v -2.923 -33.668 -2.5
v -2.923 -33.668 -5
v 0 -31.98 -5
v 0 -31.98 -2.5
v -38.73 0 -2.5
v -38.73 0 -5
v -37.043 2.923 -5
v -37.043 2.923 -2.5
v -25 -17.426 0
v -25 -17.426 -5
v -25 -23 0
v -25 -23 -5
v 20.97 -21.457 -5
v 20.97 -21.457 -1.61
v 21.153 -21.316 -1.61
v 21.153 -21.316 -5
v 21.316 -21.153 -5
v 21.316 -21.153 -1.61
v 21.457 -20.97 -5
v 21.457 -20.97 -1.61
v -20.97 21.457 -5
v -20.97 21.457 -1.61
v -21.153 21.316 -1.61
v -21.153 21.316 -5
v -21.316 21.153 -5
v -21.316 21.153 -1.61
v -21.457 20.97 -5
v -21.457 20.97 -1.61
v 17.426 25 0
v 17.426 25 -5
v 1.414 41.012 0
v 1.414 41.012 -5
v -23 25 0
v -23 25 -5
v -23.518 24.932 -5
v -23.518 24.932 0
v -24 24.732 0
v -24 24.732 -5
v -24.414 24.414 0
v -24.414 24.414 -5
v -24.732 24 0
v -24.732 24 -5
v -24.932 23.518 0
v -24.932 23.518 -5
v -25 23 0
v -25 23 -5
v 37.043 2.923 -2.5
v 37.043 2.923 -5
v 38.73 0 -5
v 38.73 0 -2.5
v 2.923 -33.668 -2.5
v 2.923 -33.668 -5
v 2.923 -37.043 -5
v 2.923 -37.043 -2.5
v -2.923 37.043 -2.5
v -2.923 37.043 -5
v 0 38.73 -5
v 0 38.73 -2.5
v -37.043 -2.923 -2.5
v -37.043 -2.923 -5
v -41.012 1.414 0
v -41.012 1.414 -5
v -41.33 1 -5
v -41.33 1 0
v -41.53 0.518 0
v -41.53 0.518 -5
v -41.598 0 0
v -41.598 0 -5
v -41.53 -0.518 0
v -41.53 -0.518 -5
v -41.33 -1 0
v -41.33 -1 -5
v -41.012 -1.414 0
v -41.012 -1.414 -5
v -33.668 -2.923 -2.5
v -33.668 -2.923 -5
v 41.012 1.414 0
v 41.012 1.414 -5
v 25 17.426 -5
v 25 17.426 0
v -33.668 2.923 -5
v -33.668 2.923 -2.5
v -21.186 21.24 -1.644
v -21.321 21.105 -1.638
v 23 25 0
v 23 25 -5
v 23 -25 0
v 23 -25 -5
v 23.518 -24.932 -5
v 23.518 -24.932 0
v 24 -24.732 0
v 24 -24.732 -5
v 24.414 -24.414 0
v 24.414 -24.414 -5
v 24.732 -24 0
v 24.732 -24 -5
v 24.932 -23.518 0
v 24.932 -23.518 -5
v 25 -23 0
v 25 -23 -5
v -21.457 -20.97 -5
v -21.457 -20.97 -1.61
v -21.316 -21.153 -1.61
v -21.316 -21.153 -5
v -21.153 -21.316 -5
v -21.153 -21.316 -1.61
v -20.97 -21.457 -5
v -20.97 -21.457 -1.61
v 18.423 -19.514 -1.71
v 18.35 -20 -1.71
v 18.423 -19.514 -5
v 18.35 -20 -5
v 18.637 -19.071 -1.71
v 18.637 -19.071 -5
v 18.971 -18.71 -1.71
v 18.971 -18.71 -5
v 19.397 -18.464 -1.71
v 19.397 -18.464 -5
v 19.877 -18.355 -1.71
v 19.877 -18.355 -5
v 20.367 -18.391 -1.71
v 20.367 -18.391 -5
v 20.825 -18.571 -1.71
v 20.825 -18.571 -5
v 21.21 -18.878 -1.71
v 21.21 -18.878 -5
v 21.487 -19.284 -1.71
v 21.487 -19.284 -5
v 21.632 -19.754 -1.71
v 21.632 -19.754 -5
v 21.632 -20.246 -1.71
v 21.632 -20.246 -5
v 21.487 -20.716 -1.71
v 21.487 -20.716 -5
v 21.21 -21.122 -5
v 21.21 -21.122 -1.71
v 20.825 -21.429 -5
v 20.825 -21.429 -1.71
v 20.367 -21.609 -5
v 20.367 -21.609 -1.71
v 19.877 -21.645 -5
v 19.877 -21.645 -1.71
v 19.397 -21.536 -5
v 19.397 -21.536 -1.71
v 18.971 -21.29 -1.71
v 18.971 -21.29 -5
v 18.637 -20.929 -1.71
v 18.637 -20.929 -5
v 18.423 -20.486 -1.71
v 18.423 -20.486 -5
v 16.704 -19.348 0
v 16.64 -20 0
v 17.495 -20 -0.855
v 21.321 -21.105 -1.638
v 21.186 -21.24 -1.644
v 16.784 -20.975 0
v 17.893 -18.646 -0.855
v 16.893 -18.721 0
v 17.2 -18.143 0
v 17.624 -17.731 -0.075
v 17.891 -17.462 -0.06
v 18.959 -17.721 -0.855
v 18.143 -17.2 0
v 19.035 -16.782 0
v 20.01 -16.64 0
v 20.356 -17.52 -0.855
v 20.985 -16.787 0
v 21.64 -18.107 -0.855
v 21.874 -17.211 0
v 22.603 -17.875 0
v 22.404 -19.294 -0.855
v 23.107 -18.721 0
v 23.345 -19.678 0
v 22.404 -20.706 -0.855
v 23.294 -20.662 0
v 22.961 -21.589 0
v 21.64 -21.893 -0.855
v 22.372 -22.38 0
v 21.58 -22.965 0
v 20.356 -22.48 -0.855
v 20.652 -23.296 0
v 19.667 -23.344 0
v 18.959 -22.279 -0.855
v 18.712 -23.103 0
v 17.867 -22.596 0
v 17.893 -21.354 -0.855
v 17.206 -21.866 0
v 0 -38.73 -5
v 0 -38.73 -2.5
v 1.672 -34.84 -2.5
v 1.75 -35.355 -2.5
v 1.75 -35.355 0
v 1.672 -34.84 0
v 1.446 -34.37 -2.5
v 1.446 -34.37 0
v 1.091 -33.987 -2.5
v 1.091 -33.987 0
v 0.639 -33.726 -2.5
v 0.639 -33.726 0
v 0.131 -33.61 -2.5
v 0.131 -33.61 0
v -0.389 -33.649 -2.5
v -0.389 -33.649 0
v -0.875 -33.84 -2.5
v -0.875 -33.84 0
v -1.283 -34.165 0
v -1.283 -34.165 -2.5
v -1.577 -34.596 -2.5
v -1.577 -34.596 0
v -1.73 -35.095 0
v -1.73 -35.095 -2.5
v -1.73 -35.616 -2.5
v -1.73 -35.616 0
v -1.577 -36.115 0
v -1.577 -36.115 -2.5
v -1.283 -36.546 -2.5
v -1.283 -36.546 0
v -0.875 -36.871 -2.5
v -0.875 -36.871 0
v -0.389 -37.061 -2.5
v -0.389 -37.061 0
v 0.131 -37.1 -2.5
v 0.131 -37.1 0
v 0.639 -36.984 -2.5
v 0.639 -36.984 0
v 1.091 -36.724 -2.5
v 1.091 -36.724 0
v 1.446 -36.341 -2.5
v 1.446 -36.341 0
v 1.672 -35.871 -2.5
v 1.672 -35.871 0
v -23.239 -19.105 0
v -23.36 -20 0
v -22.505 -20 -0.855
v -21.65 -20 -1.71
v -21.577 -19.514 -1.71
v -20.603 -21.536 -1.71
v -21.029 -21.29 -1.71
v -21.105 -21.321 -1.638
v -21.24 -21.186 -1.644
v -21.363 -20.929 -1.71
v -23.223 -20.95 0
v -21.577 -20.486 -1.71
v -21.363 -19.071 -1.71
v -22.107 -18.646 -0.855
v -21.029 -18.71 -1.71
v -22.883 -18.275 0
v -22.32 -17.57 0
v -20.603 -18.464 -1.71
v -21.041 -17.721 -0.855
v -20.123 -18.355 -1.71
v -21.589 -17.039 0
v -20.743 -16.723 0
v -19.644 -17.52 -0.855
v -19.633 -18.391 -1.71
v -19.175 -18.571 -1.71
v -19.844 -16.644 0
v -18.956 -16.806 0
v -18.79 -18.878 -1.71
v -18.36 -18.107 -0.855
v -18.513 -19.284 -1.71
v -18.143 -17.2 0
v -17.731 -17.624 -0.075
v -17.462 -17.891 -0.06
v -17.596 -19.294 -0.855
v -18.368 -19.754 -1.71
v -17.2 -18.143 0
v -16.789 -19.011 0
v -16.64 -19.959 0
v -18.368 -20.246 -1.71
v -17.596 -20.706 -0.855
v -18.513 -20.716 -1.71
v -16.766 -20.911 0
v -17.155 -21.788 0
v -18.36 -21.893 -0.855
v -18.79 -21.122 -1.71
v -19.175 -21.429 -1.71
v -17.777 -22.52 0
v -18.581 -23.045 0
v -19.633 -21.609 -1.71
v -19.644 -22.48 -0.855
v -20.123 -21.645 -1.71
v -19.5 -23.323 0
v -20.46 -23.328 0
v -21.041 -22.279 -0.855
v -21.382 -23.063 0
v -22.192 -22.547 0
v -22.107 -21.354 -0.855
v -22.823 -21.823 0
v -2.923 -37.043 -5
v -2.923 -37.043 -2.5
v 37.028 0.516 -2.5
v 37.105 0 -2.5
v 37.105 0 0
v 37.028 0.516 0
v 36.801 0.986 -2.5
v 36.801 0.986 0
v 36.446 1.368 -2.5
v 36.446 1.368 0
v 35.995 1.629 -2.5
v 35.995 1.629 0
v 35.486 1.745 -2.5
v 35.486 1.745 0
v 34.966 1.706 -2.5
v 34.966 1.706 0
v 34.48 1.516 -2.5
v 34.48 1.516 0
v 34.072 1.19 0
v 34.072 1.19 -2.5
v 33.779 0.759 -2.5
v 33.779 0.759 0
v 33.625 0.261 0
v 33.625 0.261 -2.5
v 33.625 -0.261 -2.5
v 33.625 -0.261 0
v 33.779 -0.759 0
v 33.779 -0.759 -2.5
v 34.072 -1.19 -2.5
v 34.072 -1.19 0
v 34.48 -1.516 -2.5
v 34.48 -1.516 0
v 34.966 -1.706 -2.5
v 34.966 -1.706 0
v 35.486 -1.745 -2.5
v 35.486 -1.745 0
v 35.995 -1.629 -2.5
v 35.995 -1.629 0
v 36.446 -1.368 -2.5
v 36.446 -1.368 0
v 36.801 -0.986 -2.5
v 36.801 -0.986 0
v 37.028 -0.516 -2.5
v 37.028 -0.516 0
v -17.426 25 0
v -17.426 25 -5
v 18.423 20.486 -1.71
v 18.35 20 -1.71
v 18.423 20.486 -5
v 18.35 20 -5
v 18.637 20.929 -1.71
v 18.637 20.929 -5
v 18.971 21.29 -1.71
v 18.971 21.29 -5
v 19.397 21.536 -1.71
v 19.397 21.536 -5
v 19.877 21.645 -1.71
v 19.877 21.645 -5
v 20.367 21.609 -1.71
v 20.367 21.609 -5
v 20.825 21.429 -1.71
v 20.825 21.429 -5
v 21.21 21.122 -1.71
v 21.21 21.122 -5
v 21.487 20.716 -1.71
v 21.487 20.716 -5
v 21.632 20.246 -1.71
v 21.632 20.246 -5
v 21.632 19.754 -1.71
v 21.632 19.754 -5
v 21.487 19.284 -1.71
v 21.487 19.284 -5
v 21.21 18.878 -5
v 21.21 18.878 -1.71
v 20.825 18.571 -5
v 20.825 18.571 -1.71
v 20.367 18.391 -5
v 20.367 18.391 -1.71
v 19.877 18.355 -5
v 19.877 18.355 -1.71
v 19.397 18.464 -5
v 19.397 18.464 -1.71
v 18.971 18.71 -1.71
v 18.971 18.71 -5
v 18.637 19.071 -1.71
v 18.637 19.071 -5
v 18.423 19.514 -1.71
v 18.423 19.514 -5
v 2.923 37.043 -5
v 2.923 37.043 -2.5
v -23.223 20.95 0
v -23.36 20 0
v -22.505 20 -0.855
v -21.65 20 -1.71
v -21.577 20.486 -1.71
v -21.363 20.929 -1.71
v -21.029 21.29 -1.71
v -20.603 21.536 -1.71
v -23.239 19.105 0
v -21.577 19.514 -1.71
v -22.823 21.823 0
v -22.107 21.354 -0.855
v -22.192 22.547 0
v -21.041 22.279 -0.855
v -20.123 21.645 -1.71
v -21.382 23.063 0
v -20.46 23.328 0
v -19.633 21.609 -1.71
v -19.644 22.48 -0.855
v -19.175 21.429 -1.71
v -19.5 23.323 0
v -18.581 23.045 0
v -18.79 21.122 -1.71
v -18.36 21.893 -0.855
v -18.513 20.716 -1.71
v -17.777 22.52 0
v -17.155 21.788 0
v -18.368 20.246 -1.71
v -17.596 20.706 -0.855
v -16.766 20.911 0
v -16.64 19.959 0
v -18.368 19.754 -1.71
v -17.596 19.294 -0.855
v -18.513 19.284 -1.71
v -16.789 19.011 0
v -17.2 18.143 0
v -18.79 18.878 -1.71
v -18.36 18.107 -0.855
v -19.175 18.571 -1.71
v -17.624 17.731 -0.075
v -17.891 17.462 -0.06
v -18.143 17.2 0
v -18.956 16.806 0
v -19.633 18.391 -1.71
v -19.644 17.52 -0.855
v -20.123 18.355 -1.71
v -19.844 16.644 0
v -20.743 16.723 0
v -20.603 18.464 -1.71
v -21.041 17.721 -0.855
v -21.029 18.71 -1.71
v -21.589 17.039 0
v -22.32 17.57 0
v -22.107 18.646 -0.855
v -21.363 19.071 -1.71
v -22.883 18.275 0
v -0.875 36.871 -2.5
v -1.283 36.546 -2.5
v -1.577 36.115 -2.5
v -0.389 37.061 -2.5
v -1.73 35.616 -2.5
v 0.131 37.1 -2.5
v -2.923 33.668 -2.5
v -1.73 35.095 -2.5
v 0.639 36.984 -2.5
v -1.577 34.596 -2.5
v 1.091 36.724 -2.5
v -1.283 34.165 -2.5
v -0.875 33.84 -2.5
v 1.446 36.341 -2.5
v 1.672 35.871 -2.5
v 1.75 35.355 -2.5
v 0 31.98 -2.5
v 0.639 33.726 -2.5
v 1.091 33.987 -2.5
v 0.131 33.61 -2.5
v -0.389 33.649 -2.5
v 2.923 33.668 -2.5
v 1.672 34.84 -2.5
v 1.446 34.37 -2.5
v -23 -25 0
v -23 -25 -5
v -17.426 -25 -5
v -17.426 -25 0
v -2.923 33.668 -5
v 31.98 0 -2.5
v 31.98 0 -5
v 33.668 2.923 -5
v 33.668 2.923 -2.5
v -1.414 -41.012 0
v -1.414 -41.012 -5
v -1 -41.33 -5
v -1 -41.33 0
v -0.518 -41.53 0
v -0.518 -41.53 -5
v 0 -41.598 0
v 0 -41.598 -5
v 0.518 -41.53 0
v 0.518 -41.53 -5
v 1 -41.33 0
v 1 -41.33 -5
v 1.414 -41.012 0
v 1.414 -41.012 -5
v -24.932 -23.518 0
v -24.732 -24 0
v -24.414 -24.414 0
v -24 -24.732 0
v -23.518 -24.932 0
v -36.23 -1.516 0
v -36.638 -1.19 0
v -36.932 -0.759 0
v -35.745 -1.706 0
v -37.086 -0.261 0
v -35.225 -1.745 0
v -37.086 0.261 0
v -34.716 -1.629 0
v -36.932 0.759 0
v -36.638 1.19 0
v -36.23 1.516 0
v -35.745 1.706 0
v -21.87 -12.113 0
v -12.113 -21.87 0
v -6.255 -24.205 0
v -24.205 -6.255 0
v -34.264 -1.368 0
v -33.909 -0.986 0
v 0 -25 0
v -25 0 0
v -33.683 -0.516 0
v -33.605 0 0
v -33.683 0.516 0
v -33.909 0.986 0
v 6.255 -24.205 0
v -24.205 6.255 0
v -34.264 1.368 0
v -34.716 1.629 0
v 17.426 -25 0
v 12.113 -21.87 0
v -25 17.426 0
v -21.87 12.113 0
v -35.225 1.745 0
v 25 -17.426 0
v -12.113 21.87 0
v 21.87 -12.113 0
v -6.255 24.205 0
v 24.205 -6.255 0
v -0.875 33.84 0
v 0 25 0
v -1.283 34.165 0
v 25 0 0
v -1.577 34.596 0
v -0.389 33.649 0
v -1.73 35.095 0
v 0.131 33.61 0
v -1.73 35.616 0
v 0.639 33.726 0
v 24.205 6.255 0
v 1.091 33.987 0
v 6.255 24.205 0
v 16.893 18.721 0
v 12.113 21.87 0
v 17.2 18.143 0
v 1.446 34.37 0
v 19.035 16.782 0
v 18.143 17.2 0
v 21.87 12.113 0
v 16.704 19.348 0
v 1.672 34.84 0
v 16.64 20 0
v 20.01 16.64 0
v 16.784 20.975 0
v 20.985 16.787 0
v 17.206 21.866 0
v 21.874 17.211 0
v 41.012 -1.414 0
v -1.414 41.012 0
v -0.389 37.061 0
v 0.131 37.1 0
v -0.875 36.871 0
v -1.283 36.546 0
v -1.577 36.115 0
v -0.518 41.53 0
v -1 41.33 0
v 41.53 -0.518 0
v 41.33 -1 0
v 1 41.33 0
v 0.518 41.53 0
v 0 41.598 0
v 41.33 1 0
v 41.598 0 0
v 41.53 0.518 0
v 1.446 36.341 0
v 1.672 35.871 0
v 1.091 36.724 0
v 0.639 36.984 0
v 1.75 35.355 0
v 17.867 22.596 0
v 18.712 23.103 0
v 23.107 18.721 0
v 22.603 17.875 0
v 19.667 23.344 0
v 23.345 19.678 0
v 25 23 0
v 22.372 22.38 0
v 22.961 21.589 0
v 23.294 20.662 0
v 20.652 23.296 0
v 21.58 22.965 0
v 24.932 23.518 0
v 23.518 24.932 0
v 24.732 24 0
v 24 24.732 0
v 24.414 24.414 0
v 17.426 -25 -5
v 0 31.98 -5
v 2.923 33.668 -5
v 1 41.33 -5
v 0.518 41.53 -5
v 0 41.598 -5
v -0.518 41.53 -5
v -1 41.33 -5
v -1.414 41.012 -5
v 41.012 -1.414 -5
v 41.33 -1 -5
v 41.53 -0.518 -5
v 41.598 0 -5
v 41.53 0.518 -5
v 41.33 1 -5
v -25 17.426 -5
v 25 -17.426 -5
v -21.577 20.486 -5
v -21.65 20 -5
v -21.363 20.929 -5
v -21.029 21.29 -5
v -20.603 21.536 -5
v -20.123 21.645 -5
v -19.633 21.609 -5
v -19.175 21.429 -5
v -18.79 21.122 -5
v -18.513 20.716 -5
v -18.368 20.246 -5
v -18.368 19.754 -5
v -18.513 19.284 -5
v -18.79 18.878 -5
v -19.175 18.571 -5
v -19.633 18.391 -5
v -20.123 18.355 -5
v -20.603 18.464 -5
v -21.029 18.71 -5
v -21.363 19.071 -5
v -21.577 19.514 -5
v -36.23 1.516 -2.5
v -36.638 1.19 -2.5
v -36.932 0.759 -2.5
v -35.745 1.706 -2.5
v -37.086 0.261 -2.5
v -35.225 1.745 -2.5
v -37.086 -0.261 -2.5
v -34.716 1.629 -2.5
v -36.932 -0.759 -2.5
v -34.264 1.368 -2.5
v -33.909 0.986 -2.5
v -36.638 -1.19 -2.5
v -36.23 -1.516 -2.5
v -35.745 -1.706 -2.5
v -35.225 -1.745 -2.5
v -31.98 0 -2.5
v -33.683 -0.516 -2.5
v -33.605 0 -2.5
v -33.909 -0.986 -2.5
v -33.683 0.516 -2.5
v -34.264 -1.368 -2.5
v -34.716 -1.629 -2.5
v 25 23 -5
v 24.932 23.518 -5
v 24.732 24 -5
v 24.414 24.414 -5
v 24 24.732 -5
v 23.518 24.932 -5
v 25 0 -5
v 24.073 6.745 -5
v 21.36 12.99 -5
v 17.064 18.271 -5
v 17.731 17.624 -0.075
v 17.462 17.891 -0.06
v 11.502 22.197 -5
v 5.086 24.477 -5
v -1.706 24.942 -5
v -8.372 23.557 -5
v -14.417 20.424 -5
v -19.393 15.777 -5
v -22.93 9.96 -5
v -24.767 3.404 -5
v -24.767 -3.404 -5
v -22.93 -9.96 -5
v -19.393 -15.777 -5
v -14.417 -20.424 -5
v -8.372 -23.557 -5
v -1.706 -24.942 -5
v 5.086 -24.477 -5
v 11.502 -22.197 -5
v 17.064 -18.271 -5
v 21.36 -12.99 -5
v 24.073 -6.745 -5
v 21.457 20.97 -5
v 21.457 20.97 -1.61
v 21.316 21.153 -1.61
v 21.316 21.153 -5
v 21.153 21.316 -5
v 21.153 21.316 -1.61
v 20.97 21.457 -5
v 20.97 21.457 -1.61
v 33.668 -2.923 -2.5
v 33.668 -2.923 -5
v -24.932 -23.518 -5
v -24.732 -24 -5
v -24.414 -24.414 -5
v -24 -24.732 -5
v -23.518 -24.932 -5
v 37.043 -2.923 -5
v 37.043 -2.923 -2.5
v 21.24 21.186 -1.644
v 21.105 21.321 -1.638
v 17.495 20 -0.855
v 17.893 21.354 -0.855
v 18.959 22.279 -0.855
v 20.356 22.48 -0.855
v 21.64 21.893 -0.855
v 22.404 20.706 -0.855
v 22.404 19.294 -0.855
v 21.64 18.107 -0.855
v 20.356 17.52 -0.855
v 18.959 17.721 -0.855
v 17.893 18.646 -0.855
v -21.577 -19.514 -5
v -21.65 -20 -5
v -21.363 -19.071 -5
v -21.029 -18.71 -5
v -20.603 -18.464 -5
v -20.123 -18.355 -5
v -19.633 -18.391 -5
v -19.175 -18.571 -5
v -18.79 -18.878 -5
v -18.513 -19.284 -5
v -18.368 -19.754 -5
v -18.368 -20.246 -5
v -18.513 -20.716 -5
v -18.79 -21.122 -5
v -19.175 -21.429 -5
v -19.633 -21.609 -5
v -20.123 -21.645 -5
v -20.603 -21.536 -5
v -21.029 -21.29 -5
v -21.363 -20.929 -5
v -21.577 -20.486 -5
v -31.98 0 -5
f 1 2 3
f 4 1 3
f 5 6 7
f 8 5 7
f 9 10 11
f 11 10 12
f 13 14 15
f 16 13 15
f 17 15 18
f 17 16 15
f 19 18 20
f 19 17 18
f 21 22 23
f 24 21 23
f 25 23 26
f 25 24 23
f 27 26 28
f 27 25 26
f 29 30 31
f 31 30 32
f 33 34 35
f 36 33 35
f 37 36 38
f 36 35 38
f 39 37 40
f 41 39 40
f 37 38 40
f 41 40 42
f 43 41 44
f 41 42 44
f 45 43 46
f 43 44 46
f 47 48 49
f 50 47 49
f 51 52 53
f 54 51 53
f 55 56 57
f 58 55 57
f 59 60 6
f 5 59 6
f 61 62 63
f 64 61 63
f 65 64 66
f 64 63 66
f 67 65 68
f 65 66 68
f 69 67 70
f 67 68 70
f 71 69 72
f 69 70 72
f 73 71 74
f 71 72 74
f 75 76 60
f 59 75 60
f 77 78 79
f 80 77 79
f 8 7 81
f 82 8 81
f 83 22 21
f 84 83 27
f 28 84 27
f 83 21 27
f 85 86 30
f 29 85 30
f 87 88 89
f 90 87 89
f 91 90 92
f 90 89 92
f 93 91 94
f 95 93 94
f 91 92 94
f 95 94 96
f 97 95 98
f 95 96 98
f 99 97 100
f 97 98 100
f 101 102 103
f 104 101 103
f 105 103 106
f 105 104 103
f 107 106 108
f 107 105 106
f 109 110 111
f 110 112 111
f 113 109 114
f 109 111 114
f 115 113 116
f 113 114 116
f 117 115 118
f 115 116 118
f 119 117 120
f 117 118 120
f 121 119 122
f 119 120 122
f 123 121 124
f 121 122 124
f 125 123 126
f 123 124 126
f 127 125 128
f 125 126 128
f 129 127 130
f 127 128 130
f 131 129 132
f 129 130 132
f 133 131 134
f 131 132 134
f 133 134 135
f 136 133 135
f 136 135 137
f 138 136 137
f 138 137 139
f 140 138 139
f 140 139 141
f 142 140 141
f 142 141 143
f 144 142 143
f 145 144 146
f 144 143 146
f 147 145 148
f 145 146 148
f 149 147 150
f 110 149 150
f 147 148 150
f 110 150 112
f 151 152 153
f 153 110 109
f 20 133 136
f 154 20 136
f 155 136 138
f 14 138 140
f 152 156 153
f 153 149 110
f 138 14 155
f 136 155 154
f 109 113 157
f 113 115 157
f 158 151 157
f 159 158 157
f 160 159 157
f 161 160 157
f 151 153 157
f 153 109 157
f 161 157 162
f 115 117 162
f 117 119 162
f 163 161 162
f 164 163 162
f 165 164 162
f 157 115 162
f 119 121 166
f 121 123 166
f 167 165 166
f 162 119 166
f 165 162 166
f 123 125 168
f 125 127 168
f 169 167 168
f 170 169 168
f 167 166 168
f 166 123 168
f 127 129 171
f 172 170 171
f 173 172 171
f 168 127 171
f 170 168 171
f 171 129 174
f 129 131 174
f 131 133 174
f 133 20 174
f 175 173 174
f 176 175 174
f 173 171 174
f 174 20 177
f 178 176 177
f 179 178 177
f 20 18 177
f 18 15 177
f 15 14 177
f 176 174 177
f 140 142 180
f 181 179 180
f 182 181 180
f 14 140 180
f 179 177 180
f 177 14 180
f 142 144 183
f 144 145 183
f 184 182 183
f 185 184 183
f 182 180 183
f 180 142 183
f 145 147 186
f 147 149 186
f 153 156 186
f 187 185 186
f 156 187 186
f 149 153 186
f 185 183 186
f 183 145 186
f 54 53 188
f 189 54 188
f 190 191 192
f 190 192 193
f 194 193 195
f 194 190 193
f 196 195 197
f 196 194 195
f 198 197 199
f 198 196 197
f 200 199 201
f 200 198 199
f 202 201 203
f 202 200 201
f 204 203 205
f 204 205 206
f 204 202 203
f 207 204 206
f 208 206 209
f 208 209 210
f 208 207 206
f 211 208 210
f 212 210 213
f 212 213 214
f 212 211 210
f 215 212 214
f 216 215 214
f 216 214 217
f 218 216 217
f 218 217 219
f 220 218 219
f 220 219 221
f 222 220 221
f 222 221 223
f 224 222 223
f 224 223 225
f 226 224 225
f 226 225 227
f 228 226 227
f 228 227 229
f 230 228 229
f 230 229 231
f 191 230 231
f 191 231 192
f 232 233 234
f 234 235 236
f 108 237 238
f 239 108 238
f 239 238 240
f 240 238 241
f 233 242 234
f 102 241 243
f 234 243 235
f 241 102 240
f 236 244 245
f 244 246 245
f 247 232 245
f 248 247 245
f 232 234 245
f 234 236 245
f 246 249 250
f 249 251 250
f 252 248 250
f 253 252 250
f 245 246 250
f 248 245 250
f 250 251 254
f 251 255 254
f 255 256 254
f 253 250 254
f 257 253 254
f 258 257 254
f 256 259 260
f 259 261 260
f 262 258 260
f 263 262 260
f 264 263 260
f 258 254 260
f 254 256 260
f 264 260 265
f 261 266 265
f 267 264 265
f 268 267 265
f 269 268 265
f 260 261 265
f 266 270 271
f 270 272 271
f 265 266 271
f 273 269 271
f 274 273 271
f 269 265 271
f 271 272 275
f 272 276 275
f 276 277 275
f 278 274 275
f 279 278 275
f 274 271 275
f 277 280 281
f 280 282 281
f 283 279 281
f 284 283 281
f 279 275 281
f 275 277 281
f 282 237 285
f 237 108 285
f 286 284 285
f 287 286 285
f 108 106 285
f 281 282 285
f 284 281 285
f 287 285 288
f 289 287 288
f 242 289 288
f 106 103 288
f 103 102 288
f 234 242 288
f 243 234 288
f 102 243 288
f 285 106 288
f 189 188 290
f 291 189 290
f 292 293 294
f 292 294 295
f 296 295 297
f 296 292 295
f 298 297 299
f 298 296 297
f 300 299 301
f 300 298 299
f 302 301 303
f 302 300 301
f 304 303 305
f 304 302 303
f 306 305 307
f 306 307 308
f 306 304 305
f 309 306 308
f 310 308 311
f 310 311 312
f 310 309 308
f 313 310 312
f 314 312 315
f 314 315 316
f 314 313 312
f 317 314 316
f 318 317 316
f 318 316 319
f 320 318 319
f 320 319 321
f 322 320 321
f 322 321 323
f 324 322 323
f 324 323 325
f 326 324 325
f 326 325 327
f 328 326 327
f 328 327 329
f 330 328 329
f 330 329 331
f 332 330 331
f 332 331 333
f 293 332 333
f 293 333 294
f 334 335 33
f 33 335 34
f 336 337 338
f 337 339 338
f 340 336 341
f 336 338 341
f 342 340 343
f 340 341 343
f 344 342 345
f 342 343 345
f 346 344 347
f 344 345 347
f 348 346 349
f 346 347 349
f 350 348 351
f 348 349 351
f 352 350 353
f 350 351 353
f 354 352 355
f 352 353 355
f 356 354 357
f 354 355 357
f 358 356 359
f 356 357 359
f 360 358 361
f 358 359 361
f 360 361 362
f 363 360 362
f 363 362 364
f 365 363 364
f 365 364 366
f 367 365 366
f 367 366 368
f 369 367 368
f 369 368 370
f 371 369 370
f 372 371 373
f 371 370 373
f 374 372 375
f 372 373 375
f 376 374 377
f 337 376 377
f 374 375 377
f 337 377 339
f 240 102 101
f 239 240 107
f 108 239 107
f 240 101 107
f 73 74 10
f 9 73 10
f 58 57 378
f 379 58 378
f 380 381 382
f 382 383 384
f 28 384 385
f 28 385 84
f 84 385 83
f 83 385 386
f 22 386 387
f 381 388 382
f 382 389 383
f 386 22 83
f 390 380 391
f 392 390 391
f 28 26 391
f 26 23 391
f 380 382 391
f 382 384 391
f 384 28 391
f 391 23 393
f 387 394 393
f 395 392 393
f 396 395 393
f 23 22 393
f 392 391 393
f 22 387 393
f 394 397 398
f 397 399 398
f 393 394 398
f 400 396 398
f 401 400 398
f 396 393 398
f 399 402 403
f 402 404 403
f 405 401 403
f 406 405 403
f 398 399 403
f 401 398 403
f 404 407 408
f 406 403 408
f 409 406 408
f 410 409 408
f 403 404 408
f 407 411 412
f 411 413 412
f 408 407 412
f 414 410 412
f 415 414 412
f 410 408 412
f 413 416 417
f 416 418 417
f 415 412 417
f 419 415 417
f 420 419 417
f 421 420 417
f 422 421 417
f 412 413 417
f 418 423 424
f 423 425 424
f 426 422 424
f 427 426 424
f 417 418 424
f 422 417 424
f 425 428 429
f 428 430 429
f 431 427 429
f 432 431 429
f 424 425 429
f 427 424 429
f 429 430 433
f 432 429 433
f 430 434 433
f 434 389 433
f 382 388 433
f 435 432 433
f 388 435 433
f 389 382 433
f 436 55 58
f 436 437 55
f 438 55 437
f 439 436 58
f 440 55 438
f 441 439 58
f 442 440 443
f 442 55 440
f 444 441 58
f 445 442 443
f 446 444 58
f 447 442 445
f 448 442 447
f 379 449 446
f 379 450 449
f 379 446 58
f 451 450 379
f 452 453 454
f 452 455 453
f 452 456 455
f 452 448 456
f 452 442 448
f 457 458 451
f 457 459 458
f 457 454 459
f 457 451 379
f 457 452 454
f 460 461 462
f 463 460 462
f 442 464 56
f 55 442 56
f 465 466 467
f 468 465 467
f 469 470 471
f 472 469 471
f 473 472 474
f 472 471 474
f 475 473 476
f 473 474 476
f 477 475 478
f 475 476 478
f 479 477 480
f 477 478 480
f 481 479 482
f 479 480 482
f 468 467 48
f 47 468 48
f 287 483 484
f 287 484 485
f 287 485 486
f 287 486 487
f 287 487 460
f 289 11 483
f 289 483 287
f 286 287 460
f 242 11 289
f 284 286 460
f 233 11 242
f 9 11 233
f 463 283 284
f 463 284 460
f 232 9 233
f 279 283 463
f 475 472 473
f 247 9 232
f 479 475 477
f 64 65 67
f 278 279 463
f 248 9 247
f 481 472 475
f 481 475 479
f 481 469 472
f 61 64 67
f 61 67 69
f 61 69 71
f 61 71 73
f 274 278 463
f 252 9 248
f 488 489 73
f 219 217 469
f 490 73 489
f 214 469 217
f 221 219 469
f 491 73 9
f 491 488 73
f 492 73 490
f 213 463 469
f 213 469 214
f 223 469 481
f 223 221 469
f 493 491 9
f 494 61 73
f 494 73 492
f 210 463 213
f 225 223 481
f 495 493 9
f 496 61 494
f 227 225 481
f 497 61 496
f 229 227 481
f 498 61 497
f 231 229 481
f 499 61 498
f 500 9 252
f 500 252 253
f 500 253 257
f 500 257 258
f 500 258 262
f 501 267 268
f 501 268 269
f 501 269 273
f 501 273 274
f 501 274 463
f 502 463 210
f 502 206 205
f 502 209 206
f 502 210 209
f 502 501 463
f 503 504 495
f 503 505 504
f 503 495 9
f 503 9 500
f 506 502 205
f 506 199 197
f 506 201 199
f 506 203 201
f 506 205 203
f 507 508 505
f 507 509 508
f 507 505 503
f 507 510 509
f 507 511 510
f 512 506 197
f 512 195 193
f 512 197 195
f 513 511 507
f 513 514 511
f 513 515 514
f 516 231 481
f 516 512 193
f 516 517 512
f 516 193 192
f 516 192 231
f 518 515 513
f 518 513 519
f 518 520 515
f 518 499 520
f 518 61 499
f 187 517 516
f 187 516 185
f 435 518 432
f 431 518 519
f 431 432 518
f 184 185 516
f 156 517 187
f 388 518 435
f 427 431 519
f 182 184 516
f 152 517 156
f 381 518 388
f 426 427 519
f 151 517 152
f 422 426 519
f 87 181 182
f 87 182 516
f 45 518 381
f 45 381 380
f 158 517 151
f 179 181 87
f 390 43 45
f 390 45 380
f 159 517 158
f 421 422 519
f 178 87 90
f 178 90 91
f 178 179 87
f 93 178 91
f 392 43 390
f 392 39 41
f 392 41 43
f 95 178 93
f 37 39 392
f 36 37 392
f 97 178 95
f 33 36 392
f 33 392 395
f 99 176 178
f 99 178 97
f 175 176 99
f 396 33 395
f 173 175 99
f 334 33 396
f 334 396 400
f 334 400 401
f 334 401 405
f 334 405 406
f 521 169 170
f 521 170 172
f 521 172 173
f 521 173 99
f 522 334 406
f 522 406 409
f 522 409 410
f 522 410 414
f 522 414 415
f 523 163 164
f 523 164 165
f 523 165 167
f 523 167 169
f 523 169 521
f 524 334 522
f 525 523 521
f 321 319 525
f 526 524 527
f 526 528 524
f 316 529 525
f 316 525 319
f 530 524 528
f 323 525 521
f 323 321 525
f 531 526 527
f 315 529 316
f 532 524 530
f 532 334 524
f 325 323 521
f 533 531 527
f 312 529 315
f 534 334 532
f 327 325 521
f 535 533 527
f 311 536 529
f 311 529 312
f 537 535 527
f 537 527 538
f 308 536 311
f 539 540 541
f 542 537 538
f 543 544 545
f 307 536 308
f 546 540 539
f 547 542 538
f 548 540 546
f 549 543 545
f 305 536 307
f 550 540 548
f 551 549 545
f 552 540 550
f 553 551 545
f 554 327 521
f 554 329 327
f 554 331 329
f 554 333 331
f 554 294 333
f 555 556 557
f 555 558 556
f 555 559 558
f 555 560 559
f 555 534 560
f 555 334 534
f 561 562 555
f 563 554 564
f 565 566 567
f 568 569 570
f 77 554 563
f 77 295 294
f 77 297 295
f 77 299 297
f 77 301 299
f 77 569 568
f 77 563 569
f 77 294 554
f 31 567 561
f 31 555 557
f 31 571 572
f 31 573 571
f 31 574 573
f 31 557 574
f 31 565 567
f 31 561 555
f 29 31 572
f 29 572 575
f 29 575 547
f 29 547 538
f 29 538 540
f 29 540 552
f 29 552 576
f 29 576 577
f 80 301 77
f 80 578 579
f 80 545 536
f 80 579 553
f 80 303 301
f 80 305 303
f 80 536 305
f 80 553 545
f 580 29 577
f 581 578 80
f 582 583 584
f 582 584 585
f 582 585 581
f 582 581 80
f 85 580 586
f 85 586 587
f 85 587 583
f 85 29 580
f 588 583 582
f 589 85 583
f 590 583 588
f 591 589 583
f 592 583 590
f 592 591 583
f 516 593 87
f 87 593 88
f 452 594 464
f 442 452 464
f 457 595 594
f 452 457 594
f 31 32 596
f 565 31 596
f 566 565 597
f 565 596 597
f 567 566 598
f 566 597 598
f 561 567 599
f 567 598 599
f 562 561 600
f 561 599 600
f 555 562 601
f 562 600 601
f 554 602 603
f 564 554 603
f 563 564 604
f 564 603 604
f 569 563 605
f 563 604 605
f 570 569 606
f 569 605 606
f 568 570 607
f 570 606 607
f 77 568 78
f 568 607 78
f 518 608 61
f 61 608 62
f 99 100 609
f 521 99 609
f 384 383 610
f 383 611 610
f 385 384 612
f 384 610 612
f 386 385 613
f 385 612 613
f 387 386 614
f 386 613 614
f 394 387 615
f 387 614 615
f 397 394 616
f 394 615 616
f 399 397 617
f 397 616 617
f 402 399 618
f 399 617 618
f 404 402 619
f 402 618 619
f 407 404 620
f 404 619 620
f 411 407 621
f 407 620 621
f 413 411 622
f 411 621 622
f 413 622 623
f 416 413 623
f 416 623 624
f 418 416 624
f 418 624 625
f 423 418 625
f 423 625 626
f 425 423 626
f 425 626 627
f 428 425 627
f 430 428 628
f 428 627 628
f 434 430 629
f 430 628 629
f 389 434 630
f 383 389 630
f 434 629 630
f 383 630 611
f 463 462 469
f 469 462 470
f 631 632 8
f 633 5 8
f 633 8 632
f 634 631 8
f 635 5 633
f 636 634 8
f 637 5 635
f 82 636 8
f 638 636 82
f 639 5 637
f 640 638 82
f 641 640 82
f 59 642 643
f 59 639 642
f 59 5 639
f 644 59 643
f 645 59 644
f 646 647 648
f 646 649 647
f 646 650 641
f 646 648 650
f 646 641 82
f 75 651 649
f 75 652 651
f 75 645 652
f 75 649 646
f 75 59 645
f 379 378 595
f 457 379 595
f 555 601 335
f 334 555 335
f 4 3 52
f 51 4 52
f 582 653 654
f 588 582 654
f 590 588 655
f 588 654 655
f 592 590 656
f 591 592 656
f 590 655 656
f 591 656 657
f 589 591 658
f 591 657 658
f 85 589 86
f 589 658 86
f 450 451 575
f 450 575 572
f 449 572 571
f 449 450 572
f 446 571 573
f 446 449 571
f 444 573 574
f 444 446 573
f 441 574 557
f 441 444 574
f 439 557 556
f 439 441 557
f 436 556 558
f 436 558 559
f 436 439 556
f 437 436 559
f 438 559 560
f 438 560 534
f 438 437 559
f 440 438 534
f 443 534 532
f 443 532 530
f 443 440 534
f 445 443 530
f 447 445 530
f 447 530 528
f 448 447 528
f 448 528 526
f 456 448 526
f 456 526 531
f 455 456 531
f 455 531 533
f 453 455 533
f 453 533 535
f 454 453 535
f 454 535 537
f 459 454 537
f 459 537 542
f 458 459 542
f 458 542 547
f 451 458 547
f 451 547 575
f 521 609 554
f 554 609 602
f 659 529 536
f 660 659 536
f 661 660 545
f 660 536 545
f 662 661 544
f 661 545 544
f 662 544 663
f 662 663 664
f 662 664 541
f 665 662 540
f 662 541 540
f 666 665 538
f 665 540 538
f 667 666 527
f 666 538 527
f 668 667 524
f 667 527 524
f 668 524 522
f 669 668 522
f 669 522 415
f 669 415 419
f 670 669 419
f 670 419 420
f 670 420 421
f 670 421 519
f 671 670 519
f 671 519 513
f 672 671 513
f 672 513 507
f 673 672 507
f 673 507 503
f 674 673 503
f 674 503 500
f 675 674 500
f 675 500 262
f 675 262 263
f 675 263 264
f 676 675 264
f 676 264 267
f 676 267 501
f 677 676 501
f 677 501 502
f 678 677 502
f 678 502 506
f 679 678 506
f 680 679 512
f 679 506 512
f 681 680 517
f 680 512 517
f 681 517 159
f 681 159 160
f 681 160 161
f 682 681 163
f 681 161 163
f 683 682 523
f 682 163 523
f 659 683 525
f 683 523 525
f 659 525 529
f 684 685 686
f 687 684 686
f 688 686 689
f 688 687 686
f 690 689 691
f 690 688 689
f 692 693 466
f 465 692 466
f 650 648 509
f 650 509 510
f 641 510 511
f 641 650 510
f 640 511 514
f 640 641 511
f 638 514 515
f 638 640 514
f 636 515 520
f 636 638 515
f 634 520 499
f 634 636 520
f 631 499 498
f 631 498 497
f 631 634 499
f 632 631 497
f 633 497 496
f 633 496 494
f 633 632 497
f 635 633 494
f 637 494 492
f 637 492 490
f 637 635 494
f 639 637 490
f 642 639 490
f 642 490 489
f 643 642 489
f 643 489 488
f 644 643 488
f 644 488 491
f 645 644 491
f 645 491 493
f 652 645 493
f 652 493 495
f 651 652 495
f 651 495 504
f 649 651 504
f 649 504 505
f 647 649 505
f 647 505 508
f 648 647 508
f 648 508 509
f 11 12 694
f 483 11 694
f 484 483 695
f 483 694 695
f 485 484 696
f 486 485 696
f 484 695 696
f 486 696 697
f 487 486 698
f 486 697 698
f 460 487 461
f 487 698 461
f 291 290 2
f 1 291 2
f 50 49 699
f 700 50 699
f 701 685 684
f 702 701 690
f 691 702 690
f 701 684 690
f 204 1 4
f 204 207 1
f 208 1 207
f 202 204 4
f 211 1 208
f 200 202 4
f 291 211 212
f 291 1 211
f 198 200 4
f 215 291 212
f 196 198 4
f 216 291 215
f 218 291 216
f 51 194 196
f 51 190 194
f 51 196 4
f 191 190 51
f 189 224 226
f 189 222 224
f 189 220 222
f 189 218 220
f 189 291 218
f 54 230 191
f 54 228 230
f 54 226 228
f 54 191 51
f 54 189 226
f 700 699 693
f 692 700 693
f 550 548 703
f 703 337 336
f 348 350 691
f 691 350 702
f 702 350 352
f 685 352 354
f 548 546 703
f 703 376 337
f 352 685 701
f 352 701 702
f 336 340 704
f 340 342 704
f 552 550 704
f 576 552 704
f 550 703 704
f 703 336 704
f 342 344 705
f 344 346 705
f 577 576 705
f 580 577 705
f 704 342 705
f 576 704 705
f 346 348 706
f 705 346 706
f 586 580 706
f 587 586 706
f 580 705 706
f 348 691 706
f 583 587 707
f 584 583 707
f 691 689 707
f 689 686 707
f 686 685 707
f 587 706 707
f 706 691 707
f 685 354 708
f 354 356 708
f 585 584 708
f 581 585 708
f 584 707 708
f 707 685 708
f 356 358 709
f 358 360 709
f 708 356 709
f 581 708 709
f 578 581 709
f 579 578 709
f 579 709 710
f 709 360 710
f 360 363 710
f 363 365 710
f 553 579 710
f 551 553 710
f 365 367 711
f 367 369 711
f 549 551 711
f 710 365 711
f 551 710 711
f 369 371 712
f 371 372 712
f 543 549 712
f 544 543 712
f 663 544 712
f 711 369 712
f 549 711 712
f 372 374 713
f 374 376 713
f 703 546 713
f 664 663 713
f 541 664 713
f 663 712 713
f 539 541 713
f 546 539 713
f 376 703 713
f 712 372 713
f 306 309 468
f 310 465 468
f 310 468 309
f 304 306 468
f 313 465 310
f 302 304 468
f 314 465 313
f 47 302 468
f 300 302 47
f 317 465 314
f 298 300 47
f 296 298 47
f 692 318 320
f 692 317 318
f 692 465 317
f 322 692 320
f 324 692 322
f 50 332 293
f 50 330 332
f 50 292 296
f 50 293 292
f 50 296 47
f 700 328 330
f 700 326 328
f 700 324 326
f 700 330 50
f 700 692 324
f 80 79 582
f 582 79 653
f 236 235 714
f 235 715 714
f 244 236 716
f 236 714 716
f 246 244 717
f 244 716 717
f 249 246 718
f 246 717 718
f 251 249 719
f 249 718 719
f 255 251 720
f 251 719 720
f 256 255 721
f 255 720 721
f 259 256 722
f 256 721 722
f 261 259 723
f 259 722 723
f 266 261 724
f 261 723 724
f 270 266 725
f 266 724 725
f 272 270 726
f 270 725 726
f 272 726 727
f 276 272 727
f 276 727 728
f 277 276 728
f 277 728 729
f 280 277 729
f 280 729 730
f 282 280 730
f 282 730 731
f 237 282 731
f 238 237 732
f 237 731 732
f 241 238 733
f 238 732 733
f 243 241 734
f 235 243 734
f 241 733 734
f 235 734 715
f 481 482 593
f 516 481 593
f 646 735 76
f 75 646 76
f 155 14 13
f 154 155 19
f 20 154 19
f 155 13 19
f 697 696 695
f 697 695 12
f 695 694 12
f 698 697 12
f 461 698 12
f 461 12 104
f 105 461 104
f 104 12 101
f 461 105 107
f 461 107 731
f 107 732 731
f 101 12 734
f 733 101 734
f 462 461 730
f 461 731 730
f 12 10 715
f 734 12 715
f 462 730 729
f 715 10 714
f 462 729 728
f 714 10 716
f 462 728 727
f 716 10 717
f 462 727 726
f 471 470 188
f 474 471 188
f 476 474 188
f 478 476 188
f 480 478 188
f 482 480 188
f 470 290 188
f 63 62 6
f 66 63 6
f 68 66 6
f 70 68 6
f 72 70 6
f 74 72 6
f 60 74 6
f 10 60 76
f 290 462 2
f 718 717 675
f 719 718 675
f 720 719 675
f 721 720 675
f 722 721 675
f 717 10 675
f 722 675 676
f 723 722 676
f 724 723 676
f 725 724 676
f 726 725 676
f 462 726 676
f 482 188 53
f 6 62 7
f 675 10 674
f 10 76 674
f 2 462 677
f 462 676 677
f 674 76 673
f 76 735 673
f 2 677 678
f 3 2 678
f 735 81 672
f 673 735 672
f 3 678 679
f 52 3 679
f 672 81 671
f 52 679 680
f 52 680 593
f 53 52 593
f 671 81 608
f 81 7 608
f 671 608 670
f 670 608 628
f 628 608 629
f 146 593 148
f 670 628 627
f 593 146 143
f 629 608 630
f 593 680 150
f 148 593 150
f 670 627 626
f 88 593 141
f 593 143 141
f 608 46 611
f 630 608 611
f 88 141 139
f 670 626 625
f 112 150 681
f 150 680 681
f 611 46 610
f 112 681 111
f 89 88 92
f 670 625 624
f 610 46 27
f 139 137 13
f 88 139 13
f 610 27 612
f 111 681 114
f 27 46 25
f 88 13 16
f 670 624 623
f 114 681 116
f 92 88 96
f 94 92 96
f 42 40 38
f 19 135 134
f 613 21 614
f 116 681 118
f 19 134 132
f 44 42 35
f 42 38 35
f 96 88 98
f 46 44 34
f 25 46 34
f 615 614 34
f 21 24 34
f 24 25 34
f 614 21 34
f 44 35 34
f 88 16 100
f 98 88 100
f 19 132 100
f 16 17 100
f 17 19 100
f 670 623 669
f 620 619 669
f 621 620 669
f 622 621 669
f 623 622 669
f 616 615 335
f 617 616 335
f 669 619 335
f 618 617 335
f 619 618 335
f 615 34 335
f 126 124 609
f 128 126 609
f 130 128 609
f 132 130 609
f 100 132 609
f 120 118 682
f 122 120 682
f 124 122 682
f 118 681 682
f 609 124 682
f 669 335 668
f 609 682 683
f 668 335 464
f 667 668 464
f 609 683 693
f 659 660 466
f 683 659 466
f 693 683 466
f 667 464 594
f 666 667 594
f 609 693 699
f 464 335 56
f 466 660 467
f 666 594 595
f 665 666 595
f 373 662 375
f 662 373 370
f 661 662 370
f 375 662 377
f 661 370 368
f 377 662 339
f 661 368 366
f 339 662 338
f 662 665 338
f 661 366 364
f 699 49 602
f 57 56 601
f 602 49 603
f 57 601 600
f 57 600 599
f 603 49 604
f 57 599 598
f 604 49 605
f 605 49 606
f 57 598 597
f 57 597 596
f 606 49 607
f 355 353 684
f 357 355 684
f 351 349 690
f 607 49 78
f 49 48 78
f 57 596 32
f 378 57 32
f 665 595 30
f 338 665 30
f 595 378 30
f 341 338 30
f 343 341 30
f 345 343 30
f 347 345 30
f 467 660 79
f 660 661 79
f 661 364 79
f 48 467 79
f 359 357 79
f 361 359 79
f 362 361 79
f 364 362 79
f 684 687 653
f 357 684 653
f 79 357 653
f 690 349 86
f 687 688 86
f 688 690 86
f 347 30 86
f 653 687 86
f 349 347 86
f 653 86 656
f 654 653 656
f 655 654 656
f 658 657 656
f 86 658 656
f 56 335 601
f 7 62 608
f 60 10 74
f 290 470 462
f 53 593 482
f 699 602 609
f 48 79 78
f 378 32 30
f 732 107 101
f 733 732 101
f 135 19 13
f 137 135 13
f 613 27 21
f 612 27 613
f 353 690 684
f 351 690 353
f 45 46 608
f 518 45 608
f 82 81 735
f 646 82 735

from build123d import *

# Parameters (mm, degrees)
F1_R           = 1.75
F2_DEPTH       = 5
F3_R           = 1.75
F4_DEPTH       = 5
F6_R           = 25
F7_DEPTH       = 5.001
F9_D           = 3.3
F9_CSINK_D     = 6.72
F9_CSINK_ANGLE = 90
F10_R          = 1.75
F11_DEPTH      = 2.5


with BuildPart() as f2:
    # F1 (on Top) → F2 (new body)
    with BuildSketch(Plane.XY):
        with BuildLine():
            Line((-1.4142135624, 41.0121933088), (-41.0121933088, 1.4142135624))
            ThreePointArc((-41.0121933088, 1.4142135624), (-41.5979797464, 0), (-41.0121933088, -1.4142135624))
            Line((-41.0121933088, -1.4142135624), (-1.4142135624, -41.0121933088))
            ThreePointArc((-1.4142135624, -41.0121933088), (0, -41.5979797464), (1.4142135624, -41.0121933088))
            Line((1.4142135624, -41.0121933088), (41.0121933088, -1.4142135624))
            ThreePointArc((41.0121933088, -1.4142135624), (41.5979797464, 0), (41.0121933088, 1.4142135624))
            Line((41.0121933088, 1.4142135624), (1.4142135624, 41.0121933088))
            ThreePointArc((1.4142135624, 41.0121933088), (0, 41.5979797464), (-1.4142135624, 41.0121933088))
        make_face()
        with Locations((0, -35.3553390593)):
            Circle(F1_R, mode=Mode.SUBTRACT)
        with Locations((-35.3553390593, 0)):
            Circle(F1_R, mode=Mode.SUBTRACT)
        with Locations((35.3553390593, 0)):
            Circle(F1_R, mode=Mode.SUBTRACT)
        with Locations((0, 35.3553390593)):
            Circle(F1_R, mode=Mode.SUBTRACT)
    extrude(amount=F2_DEPTH)


with BuildPart() as f4:
    # F3 (on Top) → F4 (new body)
    with BuildSketch(Plane.XY):
        with BuildLine():
            Line((23, 25), (-23, 25))
            ThreePointArc((-23, 25), (-24.4142135624, 24.4142135624), (-25, 23))
            Line((-25, 23), (-25, -23))
            ThreePointArc((-25, -23), (-24.4142135624, -24.4142135624), (-23, -25))
            Line((-23, -25), (23, -25))
            ThreePointArc((23, -25), (24.4142135624, -24.4142135624), (25, -23))
            Line((25, -23), (25, 23))
            ThreePointArc((25, 23), (24.4142135624, 24.4142135624), (23, 25))
        make_face()
        with Locations((-20, -20)):
            Circle(F3_R, mode=Mode.SUBTRACT)
        with Locations((20, -20)):
            Circle(F3_R, mode=Mode.SUBTRACT)
        with Locations((-20, 20)):
            Circle(F3_R, mode=Mode.SUBTRACT)
        with Locations((20, 20)):
            Circle(F3_R, mode=Mode.SUBTRACT)
    extrude(amount=F4_DEPTH)

    # F5: union F2
    add(f2.part)

    # F6 (on face) → F7 (cut, through all)
    with BuildSketch(Plane.XY.offset(5)):
        Circle(F6_R)
    extrude(amount=-F7_DEPTH, mode=Mode.SUBTRACT)


with BuildPart() as f4_1:
    # F8: moved
    add(f4.part.moved(Location((0, 0, -5))))

    # F9 (through all)
    with Locations(Plane.XY):
        with Locations((-20, -20), (20, 20), (20, -20), (-20, 20)):
            CounterSinkHole(F9_D / 2, F9_CSINK_D / 2, counter_sink_angle=F9_CSINK_ANGLE)

    # F10 (on face) → F11 (cut)
    with BuildSketch(Plane(origin=(0, 0, -5), x_dir=(1, 0, 0), z_dir=(0, 0, -1))):
        Polygon((37.0428390593, 2.9228357378), (33.6678390593, 2.9228357378), (31.9803390593, 0), (33.6678390593, -2.9228357378), (37.0428390593, -2.9228357378), (38.7303390593, 0), align=None)
        with Locations((35.3553390593, 0)):
            Circle(F10_R, mode=Mode.SUBTRACT)
        Polygon((-2.9228357378, 33.6678390593), (0, 31.9803390593), (2.9228357378, 33.6678390593), (2.9228357378, 37.0428390593), (0, 38.7303390593), (-2.9228357378, 37.0428390593), align=None)
        with Locations((0, 35.3553390593)):
            Circle(F10_R, mode=Mode.SUBTRACT)
        Polygon((0, -38.7303390593), (2.9228357378, -37.0428390593), (2.9228357378, -33.6678390593), (0, -31.9803390593), (-2.9228357378, -33.6678390593), (-2.9228357378, -37.0428390593), align=None)
        with Locations((0, -35.3553390593)):
            Circle(F10_R, mode=Mode.SUBTRACT)
        Polygon((-38.7303390593, 0), (-37.0428390593, -2.9228357378), (-33.6678390593, -2.9228357378), (-31.9803390593, 0), (-33.6678390593, 2.9228357378), (-37.0428390593, 2.9228357378), align=None)
        with Locations((-35.3553390593, 0)):
            Circle(F10_R, mode=Mode.SUBTRACT)
    extrude(amount=-F11_DEPTH, mode=Mode.SUBTRACT)


solid = f4_1.part
